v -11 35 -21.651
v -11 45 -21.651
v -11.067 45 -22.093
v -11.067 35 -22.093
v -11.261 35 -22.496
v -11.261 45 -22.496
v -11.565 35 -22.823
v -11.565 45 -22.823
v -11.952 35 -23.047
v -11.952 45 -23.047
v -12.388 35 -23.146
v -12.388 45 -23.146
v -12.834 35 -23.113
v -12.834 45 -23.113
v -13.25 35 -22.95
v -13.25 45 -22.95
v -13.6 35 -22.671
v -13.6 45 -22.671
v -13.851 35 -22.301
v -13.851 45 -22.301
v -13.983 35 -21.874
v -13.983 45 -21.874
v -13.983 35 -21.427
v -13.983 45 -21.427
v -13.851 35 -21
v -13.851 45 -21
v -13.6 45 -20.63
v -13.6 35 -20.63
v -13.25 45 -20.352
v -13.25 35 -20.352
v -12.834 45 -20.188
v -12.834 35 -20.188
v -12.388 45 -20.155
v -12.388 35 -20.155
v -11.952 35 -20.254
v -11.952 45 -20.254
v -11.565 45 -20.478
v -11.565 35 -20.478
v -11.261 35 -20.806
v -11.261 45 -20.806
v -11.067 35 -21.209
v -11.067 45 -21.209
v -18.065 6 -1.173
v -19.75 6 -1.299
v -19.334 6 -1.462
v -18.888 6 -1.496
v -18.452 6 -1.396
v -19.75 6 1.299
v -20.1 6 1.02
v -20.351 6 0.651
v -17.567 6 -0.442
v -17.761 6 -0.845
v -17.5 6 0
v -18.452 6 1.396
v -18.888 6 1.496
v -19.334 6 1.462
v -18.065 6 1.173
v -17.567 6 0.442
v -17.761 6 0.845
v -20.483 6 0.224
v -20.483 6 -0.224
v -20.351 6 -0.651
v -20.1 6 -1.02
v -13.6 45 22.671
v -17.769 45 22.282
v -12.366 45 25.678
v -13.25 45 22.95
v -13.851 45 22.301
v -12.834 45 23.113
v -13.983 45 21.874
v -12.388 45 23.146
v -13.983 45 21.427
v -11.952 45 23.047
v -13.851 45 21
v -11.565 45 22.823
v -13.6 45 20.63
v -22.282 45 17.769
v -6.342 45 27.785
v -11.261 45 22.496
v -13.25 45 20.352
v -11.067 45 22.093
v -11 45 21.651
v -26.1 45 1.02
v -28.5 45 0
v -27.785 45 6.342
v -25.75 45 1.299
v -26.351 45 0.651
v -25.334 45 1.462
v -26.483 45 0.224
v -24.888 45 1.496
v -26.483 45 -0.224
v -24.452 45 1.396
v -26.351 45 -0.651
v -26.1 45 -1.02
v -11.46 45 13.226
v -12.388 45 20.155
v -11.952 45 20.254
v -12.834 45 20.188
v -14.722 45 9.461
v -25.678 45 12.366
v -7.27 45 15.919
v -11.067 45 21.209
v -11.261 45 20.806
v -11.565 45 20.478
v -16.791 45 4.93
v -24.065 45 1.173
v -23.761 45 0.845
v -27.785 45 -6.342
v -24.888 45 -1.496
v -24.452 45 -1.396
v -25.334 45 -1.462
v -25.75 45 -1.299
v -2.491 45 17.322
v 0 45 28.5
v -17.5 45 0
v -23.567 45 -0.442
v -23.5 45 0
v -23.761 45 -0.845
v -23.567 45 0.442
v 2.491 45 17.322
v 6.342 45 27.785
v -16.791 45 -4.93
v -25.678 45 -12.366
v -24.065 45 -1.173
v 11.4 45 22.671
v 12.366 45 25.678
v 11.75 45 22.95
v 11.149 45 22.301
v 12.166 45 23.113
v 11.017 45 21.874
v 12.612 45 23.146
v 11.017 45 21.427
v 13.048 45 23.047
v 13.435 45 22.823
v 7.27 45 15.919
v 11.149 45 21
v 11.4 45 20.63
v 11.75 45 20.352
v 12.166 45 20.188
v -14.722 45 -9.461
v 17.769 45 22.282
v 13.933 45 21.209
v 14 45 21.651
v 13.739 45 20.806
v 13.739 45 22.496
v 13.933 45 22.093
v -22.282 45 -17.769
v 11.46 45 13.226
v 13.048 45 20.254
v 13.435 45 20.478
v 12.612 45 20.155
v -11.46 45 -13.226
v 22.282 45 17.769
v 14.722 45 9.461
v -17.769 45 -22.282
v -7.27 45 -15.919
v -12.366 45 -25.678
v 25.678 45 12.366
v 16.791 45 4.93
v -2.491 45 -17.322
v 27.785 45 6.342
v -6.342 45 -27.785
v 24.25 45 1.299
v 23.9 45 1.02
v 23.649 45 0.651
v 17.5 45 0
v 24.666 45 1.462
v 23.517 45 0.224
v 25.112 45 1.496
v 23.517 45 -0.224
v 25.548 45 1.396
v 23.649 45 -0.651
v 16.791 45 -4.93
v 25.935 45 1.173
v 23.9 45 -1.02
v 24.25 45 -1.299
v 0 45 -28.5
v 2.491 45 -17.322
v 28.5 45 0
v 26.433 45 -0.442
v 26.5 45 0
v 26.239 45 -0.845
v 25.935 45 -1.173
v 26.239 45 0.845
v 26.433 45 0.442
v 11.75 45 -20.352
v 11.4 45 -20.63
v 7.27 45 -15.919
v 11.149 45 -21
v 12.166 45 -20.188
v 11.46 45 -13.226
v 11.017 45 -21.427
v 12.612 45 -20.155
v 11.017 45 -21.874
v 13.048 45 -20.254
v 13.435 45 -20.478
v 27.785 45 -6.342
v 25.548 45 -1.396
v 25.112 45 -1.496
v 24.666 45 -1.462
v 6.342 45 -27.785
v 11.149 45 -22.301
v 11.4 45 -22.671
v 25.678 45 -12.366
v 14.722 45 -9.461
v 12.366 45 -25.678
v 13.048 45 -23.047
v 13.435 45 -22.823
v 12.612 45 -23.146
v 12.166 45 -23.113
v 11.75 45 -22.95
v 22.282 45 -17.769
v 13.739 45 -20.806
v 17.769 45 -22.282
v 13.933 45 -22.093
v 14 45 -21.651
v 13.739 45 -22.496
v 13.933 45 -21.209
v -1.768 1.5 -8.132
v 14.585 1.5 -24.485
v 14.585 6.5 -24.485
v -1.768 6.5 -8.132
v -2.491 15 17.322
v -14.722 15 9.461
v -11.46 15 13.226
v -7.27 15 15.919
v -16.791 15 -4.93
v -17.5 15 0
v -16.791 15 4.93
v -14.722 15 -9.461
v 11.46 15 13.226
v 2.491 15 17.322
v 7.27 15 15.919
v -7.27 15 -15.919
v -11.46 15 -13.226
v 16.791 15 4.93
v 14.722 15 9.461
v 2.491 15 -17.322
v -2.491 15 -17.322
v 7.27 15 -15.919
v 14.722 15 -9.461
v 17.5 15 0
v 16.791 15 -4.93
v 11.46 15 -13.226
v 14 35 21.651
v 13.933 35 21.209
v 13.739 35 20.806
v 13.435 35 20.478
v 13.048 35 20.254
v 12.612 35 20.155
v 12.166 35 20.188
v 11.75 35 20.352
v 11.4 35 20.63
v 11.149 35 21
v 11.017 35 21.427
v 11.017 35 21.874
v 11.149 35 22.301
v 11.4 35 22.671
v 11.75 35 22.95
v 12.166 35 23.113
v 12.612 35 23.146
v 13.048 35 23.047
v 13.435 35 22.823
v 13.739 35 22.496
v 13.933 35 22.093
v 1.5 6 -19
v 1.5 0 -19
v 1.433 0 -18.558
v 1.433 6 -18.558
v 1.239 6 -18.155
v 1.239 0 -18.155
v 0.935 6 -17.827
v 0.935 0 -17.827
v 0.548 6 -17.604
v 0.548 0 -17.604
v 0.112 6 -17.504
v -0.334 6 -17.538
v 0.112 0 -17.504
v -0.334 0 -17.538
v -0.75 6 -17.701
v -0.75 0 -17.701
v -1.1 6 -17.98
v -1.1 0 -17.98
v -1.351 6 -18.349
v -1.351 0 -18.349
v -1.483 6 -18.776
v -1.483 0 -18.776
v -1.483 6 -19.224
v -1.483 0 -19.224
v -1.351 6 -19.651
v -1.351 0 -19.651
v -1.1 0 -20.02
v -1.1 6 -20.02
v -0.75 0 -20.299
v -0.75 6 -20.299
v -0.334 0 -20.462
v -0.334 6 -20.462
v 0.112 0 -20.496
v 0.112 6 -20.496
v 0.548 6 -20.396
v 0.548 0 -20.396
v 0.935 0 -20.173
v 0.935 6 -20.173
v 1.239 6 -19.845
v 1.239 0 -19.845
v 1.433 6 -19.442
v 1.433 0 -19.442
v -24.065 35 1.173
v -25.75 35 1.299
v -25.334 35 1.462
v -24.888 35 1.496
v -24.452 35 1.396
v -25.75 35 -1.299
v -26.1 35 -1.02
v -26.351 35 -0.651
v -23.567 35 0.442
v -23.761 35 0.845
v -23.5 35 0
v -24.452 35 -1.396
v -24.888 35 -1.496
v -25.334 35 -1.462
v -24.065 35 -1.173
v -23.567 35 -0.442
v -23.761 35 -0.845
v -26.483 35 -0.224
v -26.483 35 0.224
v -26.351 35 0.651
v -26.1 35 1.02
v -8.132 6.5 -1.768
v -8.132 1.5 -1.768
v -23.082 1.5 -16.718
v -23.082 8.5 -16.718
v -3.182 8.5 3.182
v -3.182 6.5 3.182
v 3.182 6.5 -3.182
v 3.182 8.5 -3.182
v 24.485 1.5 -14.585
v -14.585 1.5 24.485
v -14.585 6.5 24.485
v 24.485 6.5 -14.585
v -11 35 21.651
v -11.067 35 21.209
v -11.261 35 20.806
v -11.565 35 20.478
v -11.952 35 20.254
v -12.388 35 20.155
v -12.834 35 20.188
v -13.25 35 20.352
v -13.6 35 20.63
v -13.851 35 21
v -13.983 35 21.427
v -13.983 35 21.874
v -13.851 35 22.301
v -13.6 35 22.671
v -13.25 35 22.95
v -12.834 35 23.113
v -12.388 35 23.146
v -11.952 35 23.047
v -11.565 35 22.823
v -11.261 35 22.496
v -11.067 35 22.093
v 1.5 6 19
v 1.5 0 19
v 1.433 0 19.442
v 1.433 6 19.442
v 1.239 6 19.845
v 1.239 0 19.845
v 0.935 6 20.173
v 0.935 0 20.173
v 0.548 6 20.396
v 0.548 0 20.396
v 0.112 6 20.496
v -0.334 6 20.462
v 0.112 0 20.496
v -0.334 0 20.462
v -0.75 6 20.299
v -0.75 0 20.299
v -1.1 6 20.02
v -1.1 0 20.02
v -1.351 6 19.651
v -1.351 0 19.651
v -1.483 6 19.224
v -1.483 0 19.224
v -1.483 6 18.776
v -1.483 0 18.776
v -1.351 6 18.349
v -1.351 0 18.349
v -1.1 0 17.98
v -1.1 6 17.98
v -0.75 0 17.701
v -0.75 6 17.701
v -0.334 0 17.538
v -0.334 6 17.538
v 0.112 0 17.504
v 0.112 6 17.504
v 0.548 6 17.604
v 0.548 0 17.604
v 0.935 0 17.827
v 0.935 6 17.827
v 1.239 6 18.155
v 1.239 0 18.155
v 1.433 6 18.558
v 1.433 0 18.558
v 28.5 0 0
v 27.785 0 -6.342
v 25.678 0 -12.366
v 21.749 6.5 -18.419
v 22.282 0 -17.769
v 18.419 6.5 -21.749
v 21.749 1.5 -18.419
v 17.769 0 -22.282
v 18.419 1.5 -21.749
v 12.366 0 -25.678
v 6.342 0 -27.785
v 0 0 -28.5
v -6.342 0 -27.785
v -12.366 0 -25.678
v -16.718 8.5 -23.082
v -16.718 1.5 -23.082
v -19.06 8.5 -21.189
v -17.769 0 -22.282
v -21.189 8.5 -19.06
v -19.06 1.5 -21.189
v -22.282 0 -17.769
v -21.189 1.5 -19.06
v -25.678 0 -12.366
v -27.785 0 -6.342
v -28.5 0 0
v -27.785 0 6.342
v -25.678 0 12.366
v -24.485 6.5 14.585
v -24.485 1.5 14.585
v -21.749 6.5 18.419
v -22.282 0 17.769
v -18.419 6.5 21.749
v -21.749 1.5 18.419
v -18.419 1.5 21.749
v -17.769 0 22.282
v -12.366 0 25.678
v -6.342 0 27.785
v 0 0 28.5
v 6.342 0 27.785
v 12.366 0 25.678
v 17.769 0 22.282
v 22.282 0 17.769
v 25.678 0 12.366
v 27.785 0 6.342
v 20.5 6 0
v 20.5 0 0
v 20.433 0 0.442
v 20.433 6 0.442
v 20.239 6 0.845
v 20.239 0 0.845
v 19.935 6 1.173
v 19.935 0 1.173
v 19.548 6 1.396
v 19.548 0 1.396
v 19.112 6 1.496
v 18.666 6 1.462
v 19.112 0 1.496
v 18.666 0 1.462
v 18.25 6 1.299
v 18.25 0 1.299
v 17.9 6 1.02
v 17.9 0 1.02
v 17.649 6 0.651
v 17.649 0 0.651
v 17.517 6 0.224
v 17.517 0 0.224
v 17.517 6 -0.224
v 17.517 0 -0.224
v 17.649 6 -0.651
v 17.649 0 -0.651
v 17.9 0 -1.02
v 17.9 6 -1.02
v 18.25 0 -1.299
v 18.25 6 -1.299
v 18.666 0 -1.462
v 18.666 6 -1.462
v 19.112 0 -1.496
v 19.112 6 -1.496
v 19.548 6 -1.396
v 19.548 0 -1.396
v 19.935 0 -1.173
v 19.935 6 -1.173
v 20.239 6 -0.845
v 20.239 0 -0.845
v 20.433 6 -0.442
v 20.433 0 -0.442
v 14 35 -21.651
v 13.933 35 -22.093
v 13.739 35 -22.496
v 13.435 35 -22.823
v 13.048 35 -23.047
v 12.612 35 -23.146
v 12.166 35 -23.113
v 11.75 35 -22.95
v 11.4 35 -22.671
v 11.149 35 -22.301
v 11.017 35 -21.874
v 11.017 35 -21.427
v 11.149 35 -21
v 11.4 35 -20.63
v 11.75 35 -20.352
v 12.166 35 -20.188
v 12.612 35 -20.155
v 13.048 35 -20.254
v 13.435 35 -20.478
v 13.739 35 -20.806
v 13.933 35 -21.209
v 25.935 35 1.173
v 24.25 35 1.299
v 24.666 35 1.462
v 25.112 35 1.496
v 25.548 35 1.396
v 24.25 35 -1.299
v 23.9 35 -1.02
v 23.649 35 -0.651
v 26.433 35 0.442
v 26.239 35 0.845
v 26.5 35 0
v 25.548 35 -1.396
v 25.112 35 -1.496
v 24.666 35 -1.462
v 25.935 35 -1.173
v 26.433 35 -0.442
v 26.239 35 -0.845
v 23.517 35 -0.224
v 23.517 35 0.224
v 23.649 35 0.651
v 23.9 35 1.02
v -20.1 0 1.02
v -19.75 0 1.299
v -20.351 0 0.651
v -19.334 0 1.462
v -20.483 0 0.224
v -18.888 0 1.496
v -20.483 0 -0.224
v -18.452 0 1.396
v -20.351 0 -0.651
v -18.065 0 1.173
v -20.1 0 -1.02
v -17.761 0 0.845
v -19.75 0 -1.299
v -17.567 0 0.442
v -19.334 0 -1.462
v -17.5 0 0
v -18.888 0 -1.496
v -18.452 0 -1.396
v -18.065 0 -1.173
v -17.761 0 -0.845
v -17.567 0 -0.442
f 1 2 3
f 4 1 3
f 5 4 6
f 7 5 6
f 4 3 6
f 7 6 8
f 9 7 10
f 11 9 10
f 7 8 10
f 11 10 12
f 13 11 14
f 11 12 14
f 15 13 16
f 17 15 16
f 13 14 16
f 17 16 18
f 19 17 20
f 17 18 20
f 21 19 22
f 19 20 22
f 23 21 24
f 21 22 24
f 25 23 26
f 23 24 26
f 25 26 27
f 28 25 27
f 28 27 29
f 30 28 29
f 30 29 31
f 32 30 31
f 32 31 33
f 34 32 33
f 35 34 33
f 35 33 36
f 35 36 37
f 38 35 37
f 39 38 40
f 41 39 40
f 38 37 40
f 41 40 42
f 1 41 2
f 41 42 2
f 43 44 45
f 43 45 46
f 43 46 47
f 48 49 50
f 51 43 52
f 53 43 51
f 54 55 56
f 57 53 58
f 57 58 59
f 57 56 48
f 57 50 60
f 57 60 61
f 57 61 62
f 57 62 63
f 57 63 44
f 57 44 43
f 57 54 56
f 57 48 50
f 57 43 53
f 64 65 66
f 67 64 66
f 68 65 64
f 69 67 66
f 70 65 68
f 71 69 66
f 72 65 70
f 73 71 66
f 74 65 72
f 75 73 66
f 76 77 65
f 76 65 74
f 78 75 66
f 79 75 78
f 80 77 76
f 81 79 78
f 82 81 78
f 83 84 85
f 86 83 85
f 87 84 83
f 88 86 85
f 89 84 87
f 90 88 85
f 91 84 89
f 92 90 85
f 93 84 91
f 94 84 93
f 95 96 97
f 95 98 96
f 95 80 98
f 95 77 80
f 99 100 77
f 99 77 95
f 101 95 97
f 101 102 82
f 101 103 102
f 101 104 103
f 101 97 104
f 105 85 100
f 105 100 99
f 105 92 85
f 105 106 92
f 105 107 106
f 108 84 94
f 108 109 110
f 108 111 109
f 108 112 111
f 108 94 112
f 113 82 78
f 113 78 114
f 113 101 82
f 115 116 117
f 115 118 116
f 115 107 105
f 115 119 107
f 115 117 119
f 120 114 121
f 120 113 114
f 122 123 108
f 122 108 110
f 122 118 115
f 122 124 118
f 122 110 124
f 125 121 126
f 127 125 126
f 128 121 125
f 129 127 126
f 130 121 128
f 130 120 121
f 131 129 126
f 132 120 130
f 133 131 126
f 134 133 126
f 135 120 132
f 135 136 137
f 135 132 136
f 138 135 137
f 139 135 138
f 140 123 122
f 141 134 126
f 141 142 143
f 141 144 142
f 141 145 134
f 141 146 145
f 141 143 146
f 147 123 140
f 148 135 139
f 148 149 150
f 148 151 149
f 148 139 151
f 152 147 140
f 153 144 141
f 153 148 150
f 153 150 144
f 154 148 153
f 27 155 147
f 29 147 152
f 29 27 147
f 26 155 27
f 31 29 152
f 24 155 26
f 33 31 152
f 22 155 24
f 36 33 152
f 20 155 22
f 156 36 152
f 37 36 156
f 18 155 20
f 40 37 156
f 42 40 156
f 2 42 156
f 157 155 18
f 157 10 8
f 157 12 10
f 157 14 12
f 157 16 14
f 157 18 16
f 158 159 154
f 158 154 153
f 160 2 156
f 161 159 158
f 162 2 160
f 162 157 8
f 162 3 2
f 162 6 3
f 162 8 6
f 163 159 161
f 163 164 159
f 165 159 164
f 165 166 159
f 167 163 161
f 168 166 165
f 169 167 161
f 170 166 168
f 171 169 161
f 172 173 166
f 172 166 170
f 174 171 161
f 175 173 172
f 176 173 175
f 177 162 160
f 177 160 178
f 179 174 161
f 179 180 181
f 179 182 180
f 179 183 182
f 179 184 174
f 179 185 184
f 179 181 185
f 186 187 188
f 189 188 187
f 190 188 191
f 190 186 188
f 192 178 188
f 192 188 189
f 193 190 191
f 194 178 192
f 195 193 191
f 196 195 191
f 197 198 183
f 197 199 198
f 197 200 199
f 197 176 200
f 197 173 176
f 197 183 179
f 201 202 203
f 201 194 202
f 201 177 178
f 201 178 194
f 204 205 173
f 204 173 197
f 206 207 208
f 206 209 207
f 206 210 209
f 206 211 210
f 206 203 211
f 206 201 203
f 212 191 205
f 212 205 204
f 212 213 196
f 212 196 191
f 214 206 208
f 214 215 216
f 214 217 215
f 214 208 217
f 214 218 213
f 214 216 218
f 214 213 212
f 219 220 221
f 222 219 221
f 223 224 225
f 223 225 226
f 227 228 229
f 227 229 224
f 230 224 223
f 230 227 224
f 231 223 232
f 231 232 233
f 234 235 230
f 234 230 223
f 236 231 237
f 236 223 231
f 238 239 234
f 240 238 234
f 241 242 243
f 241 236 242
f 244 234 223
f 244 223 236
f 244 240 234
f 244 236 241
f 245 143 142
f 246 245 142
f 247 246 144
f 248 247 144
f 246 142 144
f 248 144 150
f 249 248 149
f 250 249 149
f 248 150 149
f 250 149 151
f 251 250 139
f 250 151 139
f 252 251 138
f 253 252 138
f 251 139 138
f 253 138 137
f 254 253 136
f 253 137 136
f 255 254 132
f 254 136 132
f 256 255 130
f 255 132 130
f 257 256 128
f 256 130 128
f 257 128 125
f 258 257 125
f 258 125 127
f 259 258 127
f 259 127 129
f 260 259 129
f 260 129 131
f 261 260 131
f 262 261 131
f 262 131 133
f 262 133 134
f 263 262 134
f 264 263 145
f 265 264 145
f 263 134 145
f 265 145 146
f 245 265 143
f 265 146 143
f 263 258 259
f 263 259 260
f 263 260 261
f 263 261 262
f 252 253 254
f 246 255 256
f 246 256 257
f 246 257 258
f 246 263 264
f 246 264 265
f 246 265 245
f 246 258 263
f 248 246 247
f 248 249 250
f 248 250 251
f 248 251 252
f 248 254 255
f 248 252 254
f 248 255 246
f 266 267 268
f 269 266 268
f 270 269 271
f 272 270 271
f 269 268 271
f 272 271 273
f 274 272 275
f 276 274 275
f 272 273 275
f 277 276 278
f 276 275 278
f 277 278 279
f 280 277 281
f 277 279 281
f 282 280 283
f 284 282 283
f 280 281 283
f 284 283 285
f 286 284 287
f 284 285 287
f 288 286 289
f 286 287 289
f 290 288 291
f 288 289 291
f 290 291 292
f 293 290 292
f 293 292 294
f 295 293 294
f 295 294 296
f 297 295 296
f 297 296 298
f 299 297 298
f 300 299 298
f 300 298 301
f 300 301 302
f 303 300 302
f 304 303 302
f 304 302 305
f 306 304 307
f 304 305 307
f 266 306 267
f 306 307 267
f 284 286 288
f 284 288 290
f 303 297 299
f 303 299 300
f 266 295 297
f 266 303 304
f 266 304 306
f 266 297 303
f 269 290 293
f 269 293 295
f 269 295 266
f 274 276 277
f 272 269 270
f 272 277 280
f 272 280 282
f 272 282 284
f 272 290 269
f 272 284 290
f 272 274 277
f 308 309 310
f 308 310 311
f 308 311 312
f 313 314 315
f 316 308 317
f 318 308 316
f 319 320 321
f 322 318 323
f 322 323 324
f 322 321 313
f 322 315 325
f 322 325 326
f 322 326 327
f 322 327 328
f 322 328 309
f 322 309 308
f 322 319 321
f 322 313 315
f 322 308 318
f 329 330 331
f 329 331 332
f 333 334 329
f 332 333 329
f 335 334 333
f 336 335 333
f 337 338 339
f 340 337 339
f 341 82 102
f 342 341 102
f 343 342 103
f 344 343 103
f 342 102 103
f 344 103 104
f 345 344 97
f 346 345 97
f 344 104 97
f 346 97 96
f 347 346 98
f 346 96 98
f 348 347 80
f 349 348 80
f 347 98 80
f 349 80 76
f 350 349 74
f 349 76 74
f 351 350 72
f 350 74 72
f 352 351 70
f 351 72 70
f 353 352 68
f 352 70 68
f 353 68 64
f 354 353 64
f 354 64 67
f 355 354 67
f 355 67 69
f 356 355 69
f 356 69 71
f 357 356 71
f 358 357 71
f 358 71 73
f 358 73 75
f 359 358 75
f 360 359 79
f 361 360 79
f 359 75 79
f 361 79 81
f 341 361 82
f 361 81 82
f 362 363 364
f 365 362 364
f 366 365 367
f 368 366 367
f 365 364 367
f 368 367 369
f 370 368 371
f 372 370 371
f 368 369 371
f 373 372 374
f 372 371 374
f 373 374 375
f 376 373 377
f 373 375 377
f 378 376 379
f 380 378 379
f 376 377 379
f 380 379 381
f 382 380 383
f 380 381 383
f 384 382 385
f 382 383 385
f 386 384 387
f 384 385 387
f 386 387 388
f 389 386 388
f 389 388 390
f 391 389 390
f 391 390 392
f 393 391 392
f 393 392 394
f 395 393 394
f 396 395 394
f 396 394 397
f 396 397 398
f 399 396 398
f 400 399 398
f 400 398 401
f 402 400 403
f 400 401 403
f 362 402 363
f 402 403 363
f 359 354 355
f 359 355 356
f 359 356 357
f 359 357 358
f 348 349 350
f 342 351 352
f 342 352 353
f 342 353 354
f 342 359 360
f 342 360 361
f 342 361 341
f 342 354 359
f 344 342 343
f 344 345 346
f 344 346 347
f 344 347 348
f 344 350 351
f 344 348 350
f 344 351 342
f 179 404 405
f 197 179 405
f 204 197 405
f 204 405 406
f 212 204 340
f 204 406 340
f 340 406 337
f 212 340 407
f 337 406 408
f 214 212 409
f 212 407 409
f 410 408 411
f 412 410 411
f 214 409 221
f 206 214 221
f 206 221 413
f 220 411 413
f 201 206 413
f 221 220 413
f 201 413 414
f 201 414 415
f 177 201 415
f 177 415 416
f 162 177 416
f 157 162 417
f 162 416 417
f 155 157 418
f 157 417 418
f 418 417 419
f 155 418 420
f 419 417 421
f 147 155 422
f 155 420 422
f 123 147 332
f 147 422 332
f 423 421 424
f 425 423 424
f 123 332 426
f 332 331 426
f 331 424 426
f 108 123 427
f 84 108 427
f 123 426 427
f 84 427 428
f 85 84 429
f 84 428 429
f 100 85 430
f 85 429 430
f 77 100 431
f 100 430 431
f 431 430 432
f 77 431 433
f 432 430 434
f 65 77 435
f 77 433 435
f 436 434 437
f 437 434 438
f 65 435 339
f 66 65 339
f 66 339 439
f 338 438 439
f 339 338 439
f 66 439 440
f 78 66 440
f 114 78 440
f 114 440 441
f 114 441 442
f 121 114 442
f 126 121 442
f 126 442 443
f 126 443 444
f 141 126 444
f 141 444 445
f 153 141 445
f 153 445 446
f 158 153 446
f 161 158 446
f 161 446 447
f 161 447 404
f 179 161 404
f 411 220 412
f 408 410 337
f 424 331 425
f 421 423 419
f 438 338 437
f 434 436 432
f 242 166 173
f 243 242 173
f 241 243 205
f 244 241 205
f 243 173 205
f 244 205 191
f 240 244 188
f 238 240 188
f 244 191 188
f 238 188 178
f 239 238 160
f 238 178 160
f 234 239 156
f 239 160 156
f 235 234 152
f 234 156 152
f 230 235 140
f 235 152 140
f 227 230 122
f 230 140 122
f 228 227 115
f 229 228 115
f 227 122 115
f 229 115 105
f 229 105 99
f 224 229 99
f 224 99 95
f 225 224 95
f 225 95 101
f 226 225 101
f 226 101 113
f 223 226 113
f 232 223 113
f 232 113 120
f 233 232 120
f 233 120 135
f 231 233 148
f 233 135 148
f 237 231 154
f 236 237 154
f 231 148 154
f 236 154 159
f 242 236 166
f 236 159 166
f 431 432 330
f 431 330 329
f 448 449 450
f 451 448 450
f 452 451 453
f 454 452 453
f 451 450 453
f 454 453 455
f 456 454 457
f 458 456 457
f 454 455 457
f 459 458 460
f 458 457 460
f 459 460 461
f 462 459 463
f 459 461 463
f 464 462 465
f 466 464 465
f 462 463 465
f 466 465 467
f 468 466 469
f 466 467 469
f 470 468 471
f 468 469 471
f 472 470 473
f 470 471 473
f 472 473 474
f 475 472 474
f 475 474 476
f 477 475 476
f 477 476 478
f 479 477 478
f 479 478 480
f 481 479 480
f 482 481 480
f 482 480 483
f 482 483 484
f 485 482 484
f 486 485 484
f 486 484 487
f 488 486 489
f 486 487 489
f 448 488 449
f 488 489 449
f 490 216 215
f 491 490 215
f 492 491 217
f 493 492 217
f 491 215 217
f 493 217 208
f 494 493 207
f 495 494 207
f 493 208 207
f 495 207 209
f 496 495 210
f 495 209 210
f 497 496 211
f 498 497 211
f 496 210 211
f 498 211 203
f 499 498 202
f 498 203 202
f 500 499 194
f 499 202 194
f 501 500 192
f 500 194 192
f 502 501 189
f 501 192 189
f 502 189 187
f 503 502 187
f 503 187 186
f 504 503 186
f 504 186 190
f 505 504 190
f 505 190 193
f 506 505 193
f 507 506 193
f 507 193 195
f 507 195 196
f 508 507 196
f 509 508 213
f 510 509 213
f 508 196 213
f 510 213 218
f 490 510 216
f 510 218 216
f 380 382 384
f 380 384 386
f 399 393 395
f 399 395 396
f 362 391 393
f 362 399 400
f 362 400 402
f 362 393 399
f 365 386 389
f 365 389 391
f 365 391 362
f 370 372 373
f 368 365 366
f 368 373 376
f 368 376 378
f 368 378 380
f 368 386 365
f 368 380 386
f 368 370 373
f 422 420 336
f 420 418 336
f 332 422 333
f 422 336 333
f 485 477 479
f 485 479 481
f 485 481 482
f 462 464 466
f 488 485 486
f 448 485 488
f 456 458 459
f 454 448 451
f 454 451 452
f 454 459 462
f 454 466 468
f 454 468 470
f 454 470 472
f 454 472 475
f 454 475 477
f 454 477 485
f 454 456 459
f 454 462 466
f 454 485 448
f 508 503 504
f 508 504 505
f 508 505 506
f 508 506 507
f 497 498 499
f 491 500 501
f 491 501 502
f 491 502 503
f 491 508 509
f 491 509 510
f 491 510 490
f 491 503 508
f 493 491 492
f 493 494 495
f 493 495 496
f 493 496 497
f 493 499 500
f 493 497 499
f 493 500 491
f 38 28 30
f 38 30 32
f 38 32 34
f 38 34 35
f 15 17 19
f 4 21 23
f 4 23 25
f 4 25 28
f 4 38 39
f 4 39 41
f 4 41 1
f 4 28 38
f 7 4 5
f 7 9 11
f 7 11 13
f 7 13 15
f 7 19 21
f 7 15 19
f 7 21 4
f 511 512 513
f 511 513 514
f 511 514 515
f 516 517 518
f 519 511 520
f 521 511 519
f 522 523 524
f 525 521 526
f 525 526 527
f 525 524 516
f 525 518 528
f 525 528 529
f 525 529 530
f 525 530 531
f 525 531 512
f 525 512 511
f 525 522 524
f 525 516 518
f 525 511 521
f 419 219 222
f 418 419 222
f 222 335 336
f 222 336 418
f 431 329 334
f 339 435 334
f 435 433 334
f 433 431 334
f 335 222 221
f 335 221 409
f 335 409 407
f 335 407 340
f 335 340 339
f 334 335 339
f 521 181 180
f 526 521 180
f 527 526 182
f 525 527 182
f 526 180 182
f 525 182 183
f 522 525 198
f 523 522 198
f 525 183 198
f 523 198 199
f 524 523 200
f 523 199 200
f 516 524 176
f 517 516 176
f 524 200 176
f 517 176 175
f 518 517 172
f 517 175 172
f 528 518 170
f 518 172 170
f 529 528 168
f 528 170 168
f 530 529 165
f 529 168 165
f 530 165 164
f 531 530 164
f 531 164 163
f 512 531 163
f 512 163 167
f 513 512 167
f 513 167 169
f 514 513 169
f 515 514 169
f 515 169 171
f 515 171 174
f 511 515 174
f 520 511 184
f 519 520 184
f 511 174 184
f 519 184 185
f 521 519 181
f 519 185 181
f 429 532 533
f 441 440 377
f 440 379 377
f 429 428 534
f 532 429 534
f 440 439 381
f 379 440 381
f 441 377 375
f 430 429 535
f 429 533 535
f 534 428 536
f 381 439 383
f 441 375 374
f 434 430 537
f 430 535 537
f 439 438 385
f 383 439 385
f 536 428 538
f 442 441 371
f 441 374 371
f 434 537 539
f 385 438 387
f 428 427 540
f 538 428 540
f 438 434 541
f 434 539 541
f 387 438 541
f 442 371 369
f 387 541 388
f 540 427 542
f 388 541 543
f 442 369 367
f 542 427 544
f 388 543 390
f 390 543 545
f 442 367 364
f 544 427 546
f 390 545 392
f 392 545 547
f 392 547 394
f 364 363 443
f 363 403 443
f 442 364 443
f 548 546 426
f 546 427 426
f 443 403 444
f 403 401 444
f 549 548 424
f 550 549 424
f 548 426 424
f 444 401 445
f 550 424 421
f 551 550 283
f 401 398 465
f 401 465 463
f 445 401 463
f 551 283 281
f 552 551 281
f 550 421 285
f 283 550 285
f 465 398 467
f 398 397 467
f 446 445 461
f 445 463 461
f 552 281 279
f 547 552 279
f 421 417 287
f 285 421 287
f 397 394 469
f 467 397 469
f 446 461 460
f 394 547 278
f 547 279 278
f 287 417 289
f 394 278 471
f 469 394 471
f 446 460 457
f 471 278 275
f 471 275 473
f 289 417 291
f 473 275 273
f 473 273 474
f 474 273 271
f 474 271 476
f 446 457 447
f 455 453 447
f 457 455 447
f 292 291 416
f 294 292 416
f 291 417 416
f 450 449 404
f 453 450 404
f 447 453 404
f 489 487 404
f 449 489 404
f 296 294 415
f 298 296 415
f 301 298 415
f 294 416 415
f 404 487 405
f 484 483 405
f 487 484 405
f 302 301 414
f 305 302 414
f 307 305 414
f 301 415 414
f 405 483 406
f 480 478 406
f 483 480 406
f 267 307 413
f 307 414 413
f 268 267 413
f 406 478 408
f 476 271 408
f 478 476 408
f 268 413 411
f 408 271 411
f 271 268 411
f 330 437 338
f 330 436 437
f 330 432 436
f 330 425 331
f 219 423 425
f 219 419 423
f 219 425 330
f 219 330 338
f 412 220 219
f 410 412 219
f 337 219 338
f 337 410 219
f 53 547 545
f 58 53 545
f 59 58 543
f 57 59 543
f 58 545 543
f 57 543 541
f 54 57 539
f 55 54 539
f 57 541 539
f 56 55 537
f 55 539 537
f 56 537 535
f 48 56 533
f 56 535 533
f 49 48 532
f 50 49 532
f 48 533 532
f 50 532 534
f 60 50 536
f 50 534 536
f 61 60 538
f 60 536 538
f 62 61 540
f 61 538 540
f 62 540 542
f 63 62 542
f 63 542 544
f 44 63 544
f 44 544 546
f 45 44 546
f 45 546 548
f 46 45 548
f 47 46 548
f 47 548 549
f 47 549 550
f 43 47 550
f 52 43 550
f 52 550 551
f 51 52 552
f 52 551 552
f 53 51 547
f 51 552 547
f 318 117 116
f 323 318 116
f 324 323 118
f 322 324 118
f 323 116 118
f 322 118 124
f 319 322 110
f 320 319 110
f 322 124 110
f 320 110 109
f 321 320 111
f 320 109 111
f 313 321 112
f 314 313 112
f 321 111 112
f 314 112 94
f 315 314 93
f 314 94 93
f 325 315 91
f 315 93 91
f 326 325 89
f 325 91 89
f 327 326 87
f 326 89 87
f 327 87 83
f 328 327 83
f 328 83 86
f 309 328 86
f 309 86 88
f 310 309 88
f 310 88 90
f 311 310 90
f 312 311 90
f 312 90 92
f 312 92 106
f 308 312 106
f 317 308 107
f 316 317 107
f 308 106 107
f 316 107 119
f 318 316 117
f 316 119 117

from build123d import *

# Parameters (mm, degrees)
SKETCH_1_R          = 28.5
EXTRUDE_1_DEPTH     = 45
SKETCH_2_R          = 17.5
CUT_EXTRUDE_1_DEPTH = 30
SKETCH_3_R          = 1.5
CUT_EXTRUDE_2_DEPTH = 6
SKETCH_7_W          = 5
SKETCH_7_H          = 14
CUT_EXTRUDE_3_DEPTH = 45
SKETCH_8_W          = 7
SKETCH_8_H          = 9
CUT_EXTRUDE_4_DEPTH = 90
SKETCH_9_R          = 1.5
CUT_EXTRUDE_5_DEPTH = 10


with BuildPart() as part:
    # 草图1 → 凸台-拉伸1 (new body)
    with BuildSketch(Plane(origin=(0, 0, 0), x_dir=(1, 0, 0), z_dir=(0, 1, 0))):
        Circle(SKETCH_1_R)
    extrude(amount=EXTRUDE_1_DEPTH)

    # 草图2 → 切除-拉伸1 (cut)
    with BuildSketch(Plane(origin=(0, 45, 0), x_dir=(1, 0, 0), z_dir=(0, 1, 0))):
        Circle(SKETCH_2_R)
    extrude(amount=-CUT_EXTRUDE_1_DEPTH, mode=Mode.SUBTRACT)

    # 草图3 → 切除-拉伸2 (cut)
    with BuildSketch(Plane.XZ):
        with Locations((-19, 0)):
            Circle(SKETCH_3_R)
        with Locations((0, 19)):
            Circle(SKETCH_3_R)
        with Locations((19, 0)):
            Circle(SKETCH_3_R)
        with Locations((0, -19)):
            Circle(SKETCH_3_R)
    extrude(amount=-CUT_EXTRUDE_2_DEPTH, mode=Mode.SUBTRACT)

    # 草图7 → 切除-拉伸3 (cut, symmetric)
    with BuildSketch(Plane(origin=(0, 0, 0), x_dir=(0, 1, 0), z_dir=(0.7071067811865438, 0, -0.7071067811865512))):
        with Locations((4, 0)):
            Rectangle(SKETCH_7_W, SKETCH_7_H)
    extrude(amount=CUT_EXTRUDE_3_DEPTH, both=True, mode=Mode.SUBTRACT)

    # 草图8 → 切除-拉伸4 (cut)
    with BuildSketch(Plane(origin=(0, 0, 0), x_dir=(0, 1, 0), z_dir=(0.7071067811865488, 0, 0.7071067811865464))):
        with Locations((5, 0)):
            Rectangle(SKETCH_8_W, SKETCH_8_H)
    extrude(amount=-CUT_EXTRUDE_4_DEPTH, mode=Mode.SUBTRACT)

    # 草图9 → 切除-拉伸5 (cut)
    with BuildSketch(Plane(origin=(0, 45, 0), x_dir=(1, 0, 0), z_dir=(0, 1, 0))):
        with Locations((-25, 0)):
            Circle(SKETCH_9_R)
        with Locations((-12.5, 21.650635095)):
            Circle(SKETCH_9_R)
        with Locations((12.5, 21.650635095)):
            Circle(SKETCH_9_R)
        with Locations((25, 0)):
            Circle(SKETCH_9_R)
        with Locations((12.5, -21.650635095)):
            Circle(SKETCH_9_R)
        with Locations((-12.5, -21.650635095)):
            Circle(SKETCH_9_R)
    extrude(amount=-CUT_EXTRUDE_5_DEPTH, mode=Mode.SUBTRACT)


solid = part.part
